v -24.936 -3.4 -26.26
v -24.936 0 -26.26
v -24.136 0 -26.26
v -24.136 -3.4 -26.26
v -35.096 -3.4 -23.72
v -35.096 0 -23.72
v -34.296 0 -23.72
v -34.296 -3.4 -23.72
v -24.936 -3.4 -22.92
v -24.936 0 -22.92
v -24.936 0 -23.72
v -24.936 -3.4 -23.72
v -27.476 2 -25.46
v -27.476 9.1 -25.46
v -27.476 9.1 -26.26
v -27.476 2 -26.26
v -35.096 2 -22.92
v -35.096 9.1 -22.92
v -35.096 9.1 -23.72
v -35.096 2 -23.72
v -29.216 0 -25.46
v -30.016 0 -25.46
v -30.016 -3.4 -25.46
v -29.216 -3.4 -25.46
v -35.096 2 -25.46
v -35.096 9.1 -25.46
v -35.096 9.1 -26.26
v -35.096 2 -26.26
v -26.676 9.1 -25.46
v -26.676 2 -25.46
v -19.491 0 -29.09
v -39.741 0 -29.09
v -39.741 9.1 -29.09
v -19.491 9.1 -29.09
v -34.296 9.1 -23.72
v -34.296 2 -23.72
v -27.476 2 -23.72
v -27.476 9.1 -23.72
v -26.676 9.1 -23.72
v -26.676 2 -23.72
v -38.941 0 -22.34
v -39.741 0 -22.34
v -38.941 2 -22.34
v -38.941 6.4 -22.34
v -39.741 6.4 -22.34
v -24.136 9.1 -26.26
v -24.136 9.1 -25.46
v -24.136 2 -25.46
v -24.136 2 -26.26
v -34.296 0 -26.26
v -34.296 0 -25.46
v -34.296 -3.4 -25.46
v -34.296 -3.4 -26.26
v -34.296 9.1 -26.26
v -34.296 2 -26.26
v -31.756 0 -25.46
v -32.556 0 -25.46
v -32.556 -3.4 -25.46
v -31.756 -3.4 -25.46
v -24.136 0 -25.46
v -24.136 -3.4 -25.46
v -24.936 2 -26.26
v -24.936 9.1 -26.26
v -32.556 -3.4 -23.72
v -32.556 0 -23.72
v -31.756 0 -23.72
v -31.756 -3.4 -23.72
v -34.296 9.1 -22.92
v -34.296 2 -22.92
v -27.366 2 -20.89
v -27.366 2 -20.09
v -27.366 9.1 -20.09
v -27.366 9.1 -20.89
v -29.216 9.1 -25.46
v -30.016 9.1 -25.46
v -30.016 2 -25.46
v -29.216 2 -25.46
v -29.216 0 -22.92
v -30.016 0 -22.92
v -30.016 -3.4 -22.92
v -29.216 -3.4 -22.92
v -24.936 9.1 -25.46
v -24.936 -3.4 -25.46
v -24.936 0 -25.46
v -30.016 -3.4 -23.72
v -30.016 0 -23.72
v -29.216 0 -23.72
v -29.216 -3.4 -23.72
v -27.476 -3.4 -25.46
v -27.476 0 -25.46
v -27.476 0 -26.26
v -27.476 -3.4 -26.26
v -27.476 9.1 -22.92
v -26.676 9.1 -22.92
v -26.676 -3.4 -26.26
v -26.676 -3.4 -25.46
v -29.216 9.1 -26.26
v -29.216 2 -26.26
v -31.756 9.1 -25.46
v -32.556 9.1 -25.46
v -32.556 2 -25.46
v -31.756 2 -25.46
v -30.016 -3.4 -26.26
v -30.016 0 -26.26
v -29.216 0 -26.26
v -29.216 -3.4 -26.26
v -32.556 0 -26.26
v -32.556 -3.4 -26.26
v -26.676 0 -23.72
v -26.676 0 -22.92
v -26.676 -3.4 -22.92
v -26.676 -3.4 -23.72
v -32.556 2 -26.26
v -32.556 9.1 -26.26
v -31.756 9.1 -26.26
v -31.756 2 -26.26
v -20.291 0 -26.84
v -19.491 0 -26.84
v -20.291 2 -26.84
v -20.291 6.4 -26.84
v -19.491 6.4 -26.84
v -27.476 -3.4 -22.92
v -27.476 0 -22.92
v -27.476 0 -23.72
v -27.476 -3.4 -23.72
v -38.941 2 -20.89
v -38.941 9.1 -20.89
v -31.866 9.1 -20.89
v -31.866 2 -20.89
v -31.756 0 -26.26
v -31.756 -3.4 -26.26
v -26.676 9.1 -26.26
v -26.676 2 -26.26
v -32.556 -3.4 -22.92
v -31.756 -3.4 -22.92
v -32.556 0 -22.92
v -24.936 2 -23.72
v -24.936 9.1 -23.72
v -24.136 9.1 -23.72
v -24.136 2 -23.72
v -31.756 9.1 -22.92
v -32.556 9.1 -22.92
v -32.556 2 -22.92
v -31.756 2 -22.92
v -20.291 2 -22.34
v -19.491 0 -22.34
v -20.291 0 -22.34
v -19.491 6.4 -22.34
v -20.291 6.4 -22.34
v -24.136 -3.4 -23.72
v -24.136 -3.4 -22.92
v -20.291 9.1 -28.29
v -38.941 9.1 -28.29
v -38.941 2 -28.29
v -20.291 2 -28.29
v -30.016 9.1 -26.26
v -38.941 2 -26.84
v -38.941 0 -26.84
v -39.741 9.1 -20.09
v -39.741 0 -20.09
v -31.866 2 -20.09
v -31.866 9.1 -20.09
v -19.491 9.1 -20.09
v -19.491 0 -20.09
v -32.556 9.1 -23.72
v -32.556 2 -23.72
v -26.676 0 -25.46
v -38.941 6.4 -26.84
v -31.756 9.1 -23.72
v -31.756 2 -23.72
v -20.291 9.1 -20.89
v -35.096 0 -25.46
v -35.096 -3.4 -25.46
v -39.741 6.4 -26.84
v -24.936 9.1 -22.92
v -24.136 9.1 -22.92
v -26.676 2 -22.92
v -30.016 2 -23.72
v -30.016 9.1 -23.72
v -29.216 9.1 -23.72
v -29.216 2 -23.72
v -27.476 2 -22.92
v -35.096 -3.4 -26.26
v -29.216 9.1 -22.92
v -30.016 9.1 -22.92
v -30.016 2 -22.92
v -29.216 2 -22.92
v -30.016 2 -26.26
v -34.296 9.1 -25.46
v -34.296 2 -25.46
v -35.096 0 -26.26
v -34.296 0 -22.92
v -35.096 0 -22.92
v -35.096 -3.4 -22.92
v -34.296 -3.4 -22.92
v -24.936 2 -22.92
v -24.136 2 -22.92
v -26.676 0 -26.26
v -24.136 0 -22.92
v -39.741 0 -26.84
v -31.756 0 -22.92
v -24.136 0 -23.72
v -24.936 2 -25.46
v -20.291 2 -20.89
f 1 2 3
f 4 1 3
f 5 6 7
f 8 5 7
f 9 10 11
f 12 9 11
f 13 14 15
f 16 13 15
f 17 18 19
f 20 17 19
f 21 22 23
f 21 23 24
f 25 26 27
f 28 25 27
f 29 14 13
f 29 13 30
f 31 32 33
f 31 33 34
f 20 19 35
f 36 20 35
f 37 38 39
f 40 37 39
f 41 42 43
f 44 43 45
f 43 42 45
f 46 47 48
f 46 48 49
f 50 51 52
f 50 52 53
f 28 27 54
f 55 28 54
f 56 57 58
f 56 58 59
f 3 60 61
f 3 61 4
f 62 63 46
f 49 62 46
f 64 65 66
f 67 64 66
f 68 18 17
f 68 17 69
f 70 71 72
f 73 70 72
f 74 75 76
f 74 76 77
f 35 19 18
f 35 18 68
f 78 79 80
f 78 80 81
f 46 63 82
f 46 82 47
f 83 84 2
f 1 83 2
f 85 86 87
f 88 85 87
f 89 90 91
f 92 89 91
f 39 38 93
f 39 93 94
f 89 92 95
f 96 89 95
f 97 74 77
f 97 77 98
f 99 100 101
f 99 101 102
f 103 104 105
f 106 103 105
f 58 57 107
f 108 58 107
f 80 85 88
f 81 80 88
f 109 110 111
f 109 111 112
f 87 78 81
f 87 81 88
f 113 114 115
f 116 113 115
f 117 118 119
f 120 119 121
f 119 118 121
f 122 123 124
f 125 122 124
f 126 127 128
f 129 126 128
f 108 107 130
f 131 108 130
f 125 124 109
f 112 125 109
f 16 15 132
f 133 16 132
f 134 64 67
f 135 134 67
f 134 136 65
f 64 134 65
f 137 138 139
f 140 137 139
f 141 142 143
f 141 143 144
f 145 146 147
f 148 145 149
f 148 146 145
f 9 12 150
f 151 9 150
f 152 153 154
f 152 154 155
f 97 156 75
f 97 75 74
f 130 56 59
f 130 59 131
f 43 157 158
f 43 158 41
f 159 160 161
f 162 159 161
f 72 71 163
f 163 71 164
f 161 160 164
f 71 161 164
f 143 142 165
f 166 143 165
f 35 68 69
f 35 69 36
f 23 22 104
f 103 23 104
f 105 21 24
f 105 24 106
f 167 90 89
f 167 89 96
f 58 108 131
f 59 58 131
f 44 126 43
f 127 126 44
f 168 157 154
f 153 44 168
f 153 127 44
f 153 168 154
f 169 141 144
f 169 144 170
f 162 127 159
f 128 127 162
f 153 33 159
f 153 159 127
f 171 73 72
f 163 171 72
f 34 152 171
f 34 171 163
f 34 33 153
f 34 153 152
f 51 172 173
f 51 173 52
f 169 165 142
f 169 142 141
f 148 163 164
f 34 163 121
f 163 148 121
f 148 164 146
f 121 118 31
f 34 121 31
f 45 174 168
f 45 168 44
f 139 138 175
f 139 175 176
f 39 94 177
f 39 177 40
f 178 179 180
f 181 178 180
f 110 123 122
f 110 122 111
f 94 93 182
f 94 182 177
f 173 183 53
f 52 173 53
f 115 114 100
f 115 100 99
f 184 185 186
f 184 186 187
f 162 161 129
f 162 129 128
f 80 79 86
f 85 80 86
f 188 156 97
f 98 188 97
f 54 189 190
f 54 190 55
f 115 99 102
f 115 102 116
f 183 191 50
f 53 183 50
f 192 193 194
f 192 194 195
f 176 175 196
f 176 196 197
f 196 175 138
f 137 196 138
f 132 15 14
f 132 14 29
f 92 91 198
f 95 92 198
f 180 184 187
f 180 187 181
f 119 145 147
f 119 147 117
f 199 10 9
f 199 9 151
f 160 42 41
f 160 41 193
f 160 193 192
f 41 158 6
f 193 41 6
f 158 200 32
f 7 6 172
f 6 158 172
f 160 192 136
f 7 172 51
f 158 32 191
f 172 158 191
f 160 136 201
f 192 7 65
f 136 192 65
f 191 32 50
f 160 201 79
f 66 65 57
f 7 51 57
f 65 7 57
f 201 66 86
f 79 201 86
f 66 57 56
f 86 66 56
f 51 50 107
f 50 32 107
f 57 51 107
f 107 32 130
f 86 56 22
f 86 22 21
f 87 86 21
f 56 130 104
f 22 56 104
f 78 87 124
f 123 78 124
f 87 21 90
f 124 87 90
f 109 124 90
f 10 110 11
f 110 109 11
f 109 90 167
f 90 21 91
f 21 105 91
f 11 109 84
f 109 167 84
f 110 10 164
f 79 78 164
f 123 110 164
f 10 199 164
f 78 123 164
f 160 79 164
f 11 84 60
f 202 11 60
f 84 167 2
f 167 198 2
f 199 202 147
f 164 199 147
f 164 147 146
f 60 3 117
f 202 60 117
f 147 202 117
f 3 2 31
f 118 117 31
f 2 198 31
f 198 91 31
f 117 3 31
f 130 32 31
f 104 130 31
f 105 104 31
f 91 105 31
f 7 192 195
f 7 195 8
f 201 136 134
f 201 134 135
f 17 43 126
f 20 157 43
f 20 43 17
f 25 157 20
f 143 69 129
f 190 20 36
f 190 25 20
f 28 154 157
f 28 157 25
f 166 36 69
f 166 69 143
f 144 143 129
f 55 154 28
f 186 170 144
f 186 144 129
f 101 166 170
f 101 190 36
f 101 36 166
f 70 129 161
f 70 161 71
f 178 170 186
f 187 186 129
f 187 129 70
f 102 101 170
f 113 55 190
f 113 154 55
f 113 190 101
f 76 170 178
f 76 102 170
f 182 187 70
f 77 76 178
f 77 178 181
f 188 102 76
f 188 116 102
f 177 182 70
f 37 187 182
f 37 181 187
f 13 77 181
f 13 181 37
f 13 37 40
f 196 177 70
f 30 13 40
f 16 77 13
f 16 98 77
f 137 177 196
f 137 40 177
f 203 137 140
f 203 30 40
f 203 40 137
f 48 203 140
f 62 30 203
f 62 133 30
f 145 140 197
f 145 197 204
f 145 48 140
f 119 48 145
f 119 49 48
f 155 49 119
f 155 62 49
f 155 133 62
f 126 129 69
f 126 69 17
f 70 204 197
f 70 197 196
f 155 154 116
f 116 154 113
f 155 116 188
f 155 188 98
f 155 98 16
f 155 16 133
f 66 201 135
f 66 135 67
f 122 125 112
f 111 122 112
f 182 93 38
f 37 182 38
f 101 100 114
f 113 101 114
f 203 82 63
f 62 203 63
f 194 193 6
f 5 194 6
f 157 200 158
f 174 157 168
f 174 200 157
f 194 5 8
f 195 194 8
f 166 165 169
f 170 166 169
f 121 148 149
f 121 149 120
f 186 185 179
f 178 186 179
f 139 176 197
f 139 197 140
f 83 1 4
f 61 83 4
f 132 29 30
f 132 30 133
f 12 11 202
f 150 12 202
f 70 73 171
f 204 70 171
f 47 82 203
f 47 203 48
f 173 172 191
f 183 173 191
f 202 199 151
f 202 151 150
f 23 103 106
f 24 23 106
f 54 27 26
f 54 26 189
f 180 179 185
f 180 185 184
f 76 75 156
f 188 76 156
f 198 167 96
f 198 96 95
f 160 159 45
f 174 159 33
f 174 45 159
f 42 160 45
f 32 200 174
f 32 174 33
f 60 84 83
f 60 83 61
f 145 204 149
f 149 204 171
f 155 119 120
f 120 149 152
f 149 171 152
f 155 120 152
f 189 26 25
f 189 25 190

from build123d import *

# Parameters (mm, degrees)
SKETCH1_W           = 20.25
SKETCH1_H           = 9
BOSS_EXTRUDE1_DEPTH = 9.1
SKETCH2_W           = 18.65
SKETCH2_H           = 7.4
CUT_EXTRUDE1_DEPTH  = 7.1
SKETCH2_3_W         = 0.8
SKETCH2_3_H         = 0.8
BOSS_EXTRUDE2_DEPTH = 12.5
SKETCH3_W           = 4.5
SKETCH3_H           = 7.1
CUT_EXTRUDE2_DEPTH  = 2.1
SKETCH5_W           = 4.5
SKETCH5_H           = 6.4
CUT_EXTRUDE3_DEPTH  = 0.8
SKETCH6_W           = 4.5
SKETCH6_H           = 6.4
CUT_EXTRUDE4_DEPTH  = 0.8


with BuildPart() as part:
    # Sketch1 → Boss-Extrude1 (new body)
    with BuildSketch(Plane(origin=(0, 0, 0), x_dir=(1, 0, 0), z_dir=(0, 1, 0))):
        with Locations((-29.615572658, 24.590099186)):
            Rectangle(SKETCH1_W, SKETCH1_H)
    extrude(amount=BOSS_EXTRUDE1_DEPTH)

    # Sketch2 → Cut-Extrude1 (cut)
    with BuildSketch(Plane(origin=(0, 9.1, 0), x_dir=(1, 0, 0), z_dir=(0, 1, 0))):
        with Locations((-29.615572658, 24.590099186)):
            Rectangle(SKETCH2_W, SKETCH2_H)
    extrude(amount=-CUT_EXTRUDE1_DEPTH, mode=Mode.SUBTRACT)

    # Sketch2<3> → Boss-Extrude2 (add)
    with BuildSketch(Plane(origin=(0, 9.1, 0), x_dir=(1, 0, 0), z_dir=(0, 1, 0))):
        with Locations((-32.155572658, 23.320099186)):
            Rectangle(SKETCH2_3_W, SKETCH2_3_H)
        with Locations((-29.615572658, 23.320099186)):
            Rectangle(SKETCH2_3_W, SKETCH2_3_H)
        with Locations((-27.075572658, 23.320099186)):
            Rectangle(SKETCH2_3_W, SKETCH2_3_H)
        with Locations((-24.535572658, 23.320099186)):
            Rectangle(SKETCH2_3_W, SKETCH2_3_H)
        with Locations((-29.615572658, 25.860099186)):
            Rectangle(SKETCH2_3_W, SKETCH2_3_H)
        with Locations((-27.075572658, 25.860099186)):
            Rectangle(SKETCH2_3_W, SKETCH2_3_H)
        with Locations((-24.535572658, 25.860099186)):
            Rectangle(SKETCH2_3_W, SKETCH2_3_H)
        with Locations((-32.155572658, 25.860099186)):
            Rectangle(SKETCH2_3_W, SKETCH2_3_H)
        with Locations((-34.695572658, 23.320099186)):
            Rectangle(SKETCH2_3_W, SKETCH2_3_H)
        with Locations((-34.695572658, 25.860099186)):
            Rectangle(SKETCH2_3_W, SKETCH2_3_H)
    extrude(amount=-BOSS_EXTRUDE2_DEPTH)

    # Sketch3 → Cut-Extrude2 (cut)
    with BuildSketch(Plane.XY.offset(-20.090099186)):
        with Locations((-29.615572658, 5.55)):
            Rectangle(SKETCH3_W, SKETCH3_H)
    extrude(amount=-CUT_EXTRUDE2_DEPTH, mode=Mode.SUBTRACT)

    # Sketch5 → Cut-Extrude3 (cut)
    with BuildSketch(Plane.ZY.offset(39.740572658)):
        with Locations((-24.590099186, 3.2)):
            Rectangle(SKETCH5_W, SKETCH5_H)
    extrude(amount=-CUT_EXTRUDE3_DEPTH, mode=Mode.SUBTRACT)

    # Sketch6 → Cut-Extrude4 (cut)
    with BuildSketch(Plane(origin=(-19.490572658, 0, 0), x_dir=(0, 0, -1), z_dir=(1, 0, 0))):
        with Locations((24.590099186, 3.2)):
            Rectangle(SKETCH6_W, SKETCH6_H)
    extrude(amount=-CUT_EXTRUDE4_DEPTH, mode=Mode.SUBTRACT)


solid = part.part
